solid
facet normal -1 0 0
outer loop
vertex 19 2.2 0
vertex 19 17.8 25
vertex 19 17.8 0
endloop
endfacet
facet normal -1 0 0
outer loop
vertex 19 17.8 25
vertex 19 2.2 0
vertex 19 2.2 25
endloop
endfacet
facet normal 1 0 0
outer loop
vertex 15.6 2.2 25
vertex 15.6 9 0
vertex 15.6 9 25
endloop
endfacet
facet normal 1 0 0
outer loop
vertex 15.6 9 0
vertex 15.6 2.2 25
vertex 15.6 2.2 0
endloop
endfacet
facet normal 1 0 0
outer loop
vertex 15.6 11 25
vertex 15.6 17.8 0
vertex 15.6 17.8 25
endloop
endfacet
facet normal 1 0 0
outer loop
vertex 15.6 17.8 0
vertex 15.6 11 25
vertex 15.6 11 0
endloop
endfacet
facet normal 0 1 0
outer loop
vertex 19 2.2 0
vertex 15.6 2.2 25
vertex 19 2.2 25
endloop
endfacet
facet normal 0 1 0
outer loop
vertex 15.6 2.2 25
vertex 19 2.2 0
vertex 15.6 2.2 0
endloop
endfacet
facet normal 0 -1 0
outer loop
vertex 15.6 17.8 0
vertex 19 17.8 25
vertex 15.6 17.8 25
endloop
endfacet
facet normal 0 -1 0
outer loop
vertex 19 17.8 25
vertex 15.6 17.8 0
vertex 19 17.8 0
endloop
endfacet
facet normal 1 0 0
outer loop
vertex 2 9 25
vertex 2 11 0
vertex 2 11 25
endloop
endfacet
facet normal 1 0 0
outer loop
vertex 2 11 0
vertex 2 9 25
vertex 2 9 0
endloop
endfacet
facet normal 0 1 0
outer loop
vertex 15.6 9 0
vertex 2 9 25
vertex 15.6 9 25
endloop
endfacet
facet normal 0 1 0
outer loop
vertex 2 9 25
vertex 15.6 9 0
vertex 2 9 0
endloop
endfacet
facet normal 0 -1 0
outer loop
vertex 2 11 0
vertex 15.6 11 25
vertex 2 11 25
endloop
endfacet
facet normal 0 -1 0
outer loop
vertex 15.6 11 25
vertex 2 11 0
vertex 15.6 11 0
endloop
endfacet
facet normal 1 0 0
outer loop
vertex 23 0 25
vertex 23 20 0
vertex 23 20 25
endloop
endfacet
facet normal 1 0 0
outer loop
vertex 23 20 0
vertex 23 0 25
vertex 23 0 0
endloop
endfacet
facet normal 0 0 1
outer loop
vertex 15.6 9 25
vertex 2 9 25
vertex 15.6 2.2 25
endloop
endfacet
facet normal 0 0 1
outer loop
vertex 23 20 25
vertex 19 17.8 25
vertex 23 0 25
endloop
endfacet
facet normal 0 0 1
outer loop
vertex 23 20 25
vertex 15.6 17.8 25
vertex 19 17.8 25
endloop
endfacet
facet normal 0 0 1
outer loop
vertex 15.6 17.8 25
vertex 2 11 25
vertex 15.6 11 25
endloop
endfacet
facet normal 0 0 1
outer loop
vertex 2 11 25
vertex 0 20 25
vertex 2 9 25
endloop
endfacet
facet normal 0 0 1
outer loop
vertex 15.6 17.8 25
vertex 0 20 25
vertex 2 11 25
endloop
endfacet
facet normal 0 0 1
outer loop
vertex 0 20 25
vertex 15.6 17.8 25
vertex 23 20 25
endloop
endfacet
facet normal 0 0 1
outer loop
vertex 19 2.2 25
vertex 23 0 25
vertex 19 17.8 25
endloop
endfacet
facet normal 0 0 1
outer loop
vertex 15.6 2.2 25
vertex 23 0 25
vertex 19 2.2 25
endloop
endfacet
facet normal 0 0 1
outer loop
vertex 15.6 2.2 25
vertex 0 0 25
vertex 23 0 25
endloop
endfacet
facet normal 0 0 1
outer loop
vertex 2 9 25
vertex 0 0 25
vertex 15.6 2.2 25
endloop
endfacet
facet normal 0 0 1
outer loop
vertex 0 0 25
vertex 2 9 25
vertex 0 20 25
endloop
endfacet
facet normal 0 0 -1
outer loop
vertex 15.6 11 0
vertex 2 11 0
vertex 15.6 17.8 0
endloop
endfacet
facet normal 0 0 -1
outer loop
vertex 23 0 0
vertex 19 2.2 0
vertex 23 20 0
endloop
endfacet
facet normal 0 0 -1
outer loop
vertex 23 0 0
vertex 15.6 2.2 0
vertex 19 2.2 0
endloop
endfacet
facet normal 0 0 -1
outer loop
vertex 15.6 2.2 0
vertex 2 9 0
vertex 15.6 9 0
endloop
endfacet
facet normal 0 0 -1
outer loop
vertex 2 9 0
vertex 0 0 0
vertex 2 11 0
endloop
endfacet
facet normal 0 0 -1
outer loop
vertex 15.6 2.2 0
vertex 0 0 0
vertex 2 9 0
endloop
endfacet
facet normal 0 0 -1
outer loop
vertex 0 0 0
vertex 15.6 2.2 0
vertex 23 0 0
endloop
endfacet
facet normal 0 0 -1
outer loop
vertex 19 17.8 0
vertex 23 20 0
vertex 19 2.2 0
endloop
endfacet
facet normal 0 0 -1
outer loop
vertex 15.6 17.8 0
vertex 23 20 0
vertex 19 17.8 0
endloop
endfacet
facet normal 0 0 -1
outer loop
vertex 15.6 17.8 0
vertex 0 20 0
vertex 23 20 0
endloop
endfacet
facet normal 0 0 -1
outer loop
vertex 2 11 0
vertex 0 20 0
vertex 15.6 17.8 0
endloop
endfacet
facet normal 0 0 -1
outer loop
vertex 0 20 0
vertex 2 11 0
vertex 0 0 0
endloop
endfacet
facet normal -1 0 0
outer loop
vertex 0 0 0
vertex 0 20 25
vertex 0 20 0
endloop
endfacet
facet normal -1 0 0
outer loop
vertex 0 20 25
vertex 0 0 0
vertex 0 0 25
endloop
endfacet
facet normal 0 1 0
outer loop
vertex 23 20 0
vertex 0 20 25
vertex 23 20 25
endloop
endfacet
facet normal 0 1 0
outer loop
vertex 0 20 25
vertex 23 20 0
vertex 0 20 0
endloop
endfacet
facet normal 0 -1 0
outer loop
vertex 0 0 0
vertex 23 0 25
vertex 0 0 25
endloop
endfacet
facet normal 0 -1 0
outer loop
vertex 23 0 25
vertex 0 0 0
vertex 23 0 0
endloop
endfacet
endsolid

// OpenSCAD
tBarWidth = 15;
tBarHeight = 15;
tBarLength = 300;
tBarThickness = 1.4;

$fn = 30;

//assembly();
testPart();

module tExtrusion(lenth, expansionHorizontal, expansionVertical)
{
	translate([0, -tBarWidth/2 - expansionHorizontal, tBarHeight-tBarThickness])
	cube([lenth, tBarWidth+2*expansionHorizontal, tBarThickness + 2*expansionVertical]);

	translate([0, -tBarThickness/2 - expansionHorizontal, 0])
	cube([lenth, tBarThickness + 2*expansionHorizontal, tBarHeight + 2*expansionVertical]);
}

module testPart()
{
	difference()
	{
		cube([23, 20, 25]);

		translate([2, 10, -1])
		rotate([0, -90, 180])
		#tExtrusion(27, 0.3, 1);
	}
}

module assembly()
{
	difference()
	{
		union()
		{
			tExtrusion(tBarLength, 0);

			translate([300/2 + 50, 0, 0])
			arm(100, 5/2);

			translate([300/2 - 50, 0, 0])
	//		translate([-25/2, 0, 15/2])
	//		rotate([0, 2.2, 0])
	//		translate([25/2, 0, -15/2])
			rotate([0, 0, 180])
			arm(100, 5/2);
		}

	/*
		translate([-10, 0, -100])
		cube([1000, 1000, 1000]);

		translate([-10, -1000 - 2, -100])
		cube([1000, 1000, 1000]);
	*/
	}
}

module arm(h, circleR)
{
	extra = 5;
	thickness = 15;
	topBridge = 10;
	bridge = 5;
	sleeveLen = 25;
	armWidth = 10;

	expansion = 0.5;

	r = sleeveLen;
	d = tBarHeight;
	s = tBarHeight + 2*expansion;

	angle = asin( (-r*d+s*sqrt(s*s+r*r-d*d)) / (s*s+r*r));

	difference()
	{
		union()
		{
			hull()
			{
				translate([0, -armWidth/2, tBarHeight + topBridge])
				cube([thickness, armWidth, h-circleR*4]);

				translate([0, -armWidth/2, tBarHeight + topBridge])
				cube([sleeveLen, armWidth, 1]);
			}

			translate([0, 0, tBarHeight + topBridge + h - armWidth/2])
			rotate([0, 90, 0])
			cylinder(r = circleR*3, h = thickness);

			hull()
			{
				translate([0, -armWidth/2, tBarHeight + topBridge])
				cube([sleeveLen, armWidth, 1]);

				translate([0, -tBarWidth/2 - extra, -bridge])
				cube([sleeveLen, tBarWidth + extra*2, tBarHeight + bridge*2]);
			}
		}

		translate([-1, 0, -expansion])
		translate([sleeveLen/2, 0, tBarHeight/2])
		rotate([0, angle, 0])
		translate([-sleeveLen/2, 0, -tBarHeight/2])
		tExtrusion(sleeveLen + 2, expansion);

		translate([0, 0, tBarHeight + topBridge + h - armWidth/2])
		rotate([0, 90, 0])
		translate([0, 0, -1])
		cylinder(r = circleR, h = thickness + 2);
	}
}
